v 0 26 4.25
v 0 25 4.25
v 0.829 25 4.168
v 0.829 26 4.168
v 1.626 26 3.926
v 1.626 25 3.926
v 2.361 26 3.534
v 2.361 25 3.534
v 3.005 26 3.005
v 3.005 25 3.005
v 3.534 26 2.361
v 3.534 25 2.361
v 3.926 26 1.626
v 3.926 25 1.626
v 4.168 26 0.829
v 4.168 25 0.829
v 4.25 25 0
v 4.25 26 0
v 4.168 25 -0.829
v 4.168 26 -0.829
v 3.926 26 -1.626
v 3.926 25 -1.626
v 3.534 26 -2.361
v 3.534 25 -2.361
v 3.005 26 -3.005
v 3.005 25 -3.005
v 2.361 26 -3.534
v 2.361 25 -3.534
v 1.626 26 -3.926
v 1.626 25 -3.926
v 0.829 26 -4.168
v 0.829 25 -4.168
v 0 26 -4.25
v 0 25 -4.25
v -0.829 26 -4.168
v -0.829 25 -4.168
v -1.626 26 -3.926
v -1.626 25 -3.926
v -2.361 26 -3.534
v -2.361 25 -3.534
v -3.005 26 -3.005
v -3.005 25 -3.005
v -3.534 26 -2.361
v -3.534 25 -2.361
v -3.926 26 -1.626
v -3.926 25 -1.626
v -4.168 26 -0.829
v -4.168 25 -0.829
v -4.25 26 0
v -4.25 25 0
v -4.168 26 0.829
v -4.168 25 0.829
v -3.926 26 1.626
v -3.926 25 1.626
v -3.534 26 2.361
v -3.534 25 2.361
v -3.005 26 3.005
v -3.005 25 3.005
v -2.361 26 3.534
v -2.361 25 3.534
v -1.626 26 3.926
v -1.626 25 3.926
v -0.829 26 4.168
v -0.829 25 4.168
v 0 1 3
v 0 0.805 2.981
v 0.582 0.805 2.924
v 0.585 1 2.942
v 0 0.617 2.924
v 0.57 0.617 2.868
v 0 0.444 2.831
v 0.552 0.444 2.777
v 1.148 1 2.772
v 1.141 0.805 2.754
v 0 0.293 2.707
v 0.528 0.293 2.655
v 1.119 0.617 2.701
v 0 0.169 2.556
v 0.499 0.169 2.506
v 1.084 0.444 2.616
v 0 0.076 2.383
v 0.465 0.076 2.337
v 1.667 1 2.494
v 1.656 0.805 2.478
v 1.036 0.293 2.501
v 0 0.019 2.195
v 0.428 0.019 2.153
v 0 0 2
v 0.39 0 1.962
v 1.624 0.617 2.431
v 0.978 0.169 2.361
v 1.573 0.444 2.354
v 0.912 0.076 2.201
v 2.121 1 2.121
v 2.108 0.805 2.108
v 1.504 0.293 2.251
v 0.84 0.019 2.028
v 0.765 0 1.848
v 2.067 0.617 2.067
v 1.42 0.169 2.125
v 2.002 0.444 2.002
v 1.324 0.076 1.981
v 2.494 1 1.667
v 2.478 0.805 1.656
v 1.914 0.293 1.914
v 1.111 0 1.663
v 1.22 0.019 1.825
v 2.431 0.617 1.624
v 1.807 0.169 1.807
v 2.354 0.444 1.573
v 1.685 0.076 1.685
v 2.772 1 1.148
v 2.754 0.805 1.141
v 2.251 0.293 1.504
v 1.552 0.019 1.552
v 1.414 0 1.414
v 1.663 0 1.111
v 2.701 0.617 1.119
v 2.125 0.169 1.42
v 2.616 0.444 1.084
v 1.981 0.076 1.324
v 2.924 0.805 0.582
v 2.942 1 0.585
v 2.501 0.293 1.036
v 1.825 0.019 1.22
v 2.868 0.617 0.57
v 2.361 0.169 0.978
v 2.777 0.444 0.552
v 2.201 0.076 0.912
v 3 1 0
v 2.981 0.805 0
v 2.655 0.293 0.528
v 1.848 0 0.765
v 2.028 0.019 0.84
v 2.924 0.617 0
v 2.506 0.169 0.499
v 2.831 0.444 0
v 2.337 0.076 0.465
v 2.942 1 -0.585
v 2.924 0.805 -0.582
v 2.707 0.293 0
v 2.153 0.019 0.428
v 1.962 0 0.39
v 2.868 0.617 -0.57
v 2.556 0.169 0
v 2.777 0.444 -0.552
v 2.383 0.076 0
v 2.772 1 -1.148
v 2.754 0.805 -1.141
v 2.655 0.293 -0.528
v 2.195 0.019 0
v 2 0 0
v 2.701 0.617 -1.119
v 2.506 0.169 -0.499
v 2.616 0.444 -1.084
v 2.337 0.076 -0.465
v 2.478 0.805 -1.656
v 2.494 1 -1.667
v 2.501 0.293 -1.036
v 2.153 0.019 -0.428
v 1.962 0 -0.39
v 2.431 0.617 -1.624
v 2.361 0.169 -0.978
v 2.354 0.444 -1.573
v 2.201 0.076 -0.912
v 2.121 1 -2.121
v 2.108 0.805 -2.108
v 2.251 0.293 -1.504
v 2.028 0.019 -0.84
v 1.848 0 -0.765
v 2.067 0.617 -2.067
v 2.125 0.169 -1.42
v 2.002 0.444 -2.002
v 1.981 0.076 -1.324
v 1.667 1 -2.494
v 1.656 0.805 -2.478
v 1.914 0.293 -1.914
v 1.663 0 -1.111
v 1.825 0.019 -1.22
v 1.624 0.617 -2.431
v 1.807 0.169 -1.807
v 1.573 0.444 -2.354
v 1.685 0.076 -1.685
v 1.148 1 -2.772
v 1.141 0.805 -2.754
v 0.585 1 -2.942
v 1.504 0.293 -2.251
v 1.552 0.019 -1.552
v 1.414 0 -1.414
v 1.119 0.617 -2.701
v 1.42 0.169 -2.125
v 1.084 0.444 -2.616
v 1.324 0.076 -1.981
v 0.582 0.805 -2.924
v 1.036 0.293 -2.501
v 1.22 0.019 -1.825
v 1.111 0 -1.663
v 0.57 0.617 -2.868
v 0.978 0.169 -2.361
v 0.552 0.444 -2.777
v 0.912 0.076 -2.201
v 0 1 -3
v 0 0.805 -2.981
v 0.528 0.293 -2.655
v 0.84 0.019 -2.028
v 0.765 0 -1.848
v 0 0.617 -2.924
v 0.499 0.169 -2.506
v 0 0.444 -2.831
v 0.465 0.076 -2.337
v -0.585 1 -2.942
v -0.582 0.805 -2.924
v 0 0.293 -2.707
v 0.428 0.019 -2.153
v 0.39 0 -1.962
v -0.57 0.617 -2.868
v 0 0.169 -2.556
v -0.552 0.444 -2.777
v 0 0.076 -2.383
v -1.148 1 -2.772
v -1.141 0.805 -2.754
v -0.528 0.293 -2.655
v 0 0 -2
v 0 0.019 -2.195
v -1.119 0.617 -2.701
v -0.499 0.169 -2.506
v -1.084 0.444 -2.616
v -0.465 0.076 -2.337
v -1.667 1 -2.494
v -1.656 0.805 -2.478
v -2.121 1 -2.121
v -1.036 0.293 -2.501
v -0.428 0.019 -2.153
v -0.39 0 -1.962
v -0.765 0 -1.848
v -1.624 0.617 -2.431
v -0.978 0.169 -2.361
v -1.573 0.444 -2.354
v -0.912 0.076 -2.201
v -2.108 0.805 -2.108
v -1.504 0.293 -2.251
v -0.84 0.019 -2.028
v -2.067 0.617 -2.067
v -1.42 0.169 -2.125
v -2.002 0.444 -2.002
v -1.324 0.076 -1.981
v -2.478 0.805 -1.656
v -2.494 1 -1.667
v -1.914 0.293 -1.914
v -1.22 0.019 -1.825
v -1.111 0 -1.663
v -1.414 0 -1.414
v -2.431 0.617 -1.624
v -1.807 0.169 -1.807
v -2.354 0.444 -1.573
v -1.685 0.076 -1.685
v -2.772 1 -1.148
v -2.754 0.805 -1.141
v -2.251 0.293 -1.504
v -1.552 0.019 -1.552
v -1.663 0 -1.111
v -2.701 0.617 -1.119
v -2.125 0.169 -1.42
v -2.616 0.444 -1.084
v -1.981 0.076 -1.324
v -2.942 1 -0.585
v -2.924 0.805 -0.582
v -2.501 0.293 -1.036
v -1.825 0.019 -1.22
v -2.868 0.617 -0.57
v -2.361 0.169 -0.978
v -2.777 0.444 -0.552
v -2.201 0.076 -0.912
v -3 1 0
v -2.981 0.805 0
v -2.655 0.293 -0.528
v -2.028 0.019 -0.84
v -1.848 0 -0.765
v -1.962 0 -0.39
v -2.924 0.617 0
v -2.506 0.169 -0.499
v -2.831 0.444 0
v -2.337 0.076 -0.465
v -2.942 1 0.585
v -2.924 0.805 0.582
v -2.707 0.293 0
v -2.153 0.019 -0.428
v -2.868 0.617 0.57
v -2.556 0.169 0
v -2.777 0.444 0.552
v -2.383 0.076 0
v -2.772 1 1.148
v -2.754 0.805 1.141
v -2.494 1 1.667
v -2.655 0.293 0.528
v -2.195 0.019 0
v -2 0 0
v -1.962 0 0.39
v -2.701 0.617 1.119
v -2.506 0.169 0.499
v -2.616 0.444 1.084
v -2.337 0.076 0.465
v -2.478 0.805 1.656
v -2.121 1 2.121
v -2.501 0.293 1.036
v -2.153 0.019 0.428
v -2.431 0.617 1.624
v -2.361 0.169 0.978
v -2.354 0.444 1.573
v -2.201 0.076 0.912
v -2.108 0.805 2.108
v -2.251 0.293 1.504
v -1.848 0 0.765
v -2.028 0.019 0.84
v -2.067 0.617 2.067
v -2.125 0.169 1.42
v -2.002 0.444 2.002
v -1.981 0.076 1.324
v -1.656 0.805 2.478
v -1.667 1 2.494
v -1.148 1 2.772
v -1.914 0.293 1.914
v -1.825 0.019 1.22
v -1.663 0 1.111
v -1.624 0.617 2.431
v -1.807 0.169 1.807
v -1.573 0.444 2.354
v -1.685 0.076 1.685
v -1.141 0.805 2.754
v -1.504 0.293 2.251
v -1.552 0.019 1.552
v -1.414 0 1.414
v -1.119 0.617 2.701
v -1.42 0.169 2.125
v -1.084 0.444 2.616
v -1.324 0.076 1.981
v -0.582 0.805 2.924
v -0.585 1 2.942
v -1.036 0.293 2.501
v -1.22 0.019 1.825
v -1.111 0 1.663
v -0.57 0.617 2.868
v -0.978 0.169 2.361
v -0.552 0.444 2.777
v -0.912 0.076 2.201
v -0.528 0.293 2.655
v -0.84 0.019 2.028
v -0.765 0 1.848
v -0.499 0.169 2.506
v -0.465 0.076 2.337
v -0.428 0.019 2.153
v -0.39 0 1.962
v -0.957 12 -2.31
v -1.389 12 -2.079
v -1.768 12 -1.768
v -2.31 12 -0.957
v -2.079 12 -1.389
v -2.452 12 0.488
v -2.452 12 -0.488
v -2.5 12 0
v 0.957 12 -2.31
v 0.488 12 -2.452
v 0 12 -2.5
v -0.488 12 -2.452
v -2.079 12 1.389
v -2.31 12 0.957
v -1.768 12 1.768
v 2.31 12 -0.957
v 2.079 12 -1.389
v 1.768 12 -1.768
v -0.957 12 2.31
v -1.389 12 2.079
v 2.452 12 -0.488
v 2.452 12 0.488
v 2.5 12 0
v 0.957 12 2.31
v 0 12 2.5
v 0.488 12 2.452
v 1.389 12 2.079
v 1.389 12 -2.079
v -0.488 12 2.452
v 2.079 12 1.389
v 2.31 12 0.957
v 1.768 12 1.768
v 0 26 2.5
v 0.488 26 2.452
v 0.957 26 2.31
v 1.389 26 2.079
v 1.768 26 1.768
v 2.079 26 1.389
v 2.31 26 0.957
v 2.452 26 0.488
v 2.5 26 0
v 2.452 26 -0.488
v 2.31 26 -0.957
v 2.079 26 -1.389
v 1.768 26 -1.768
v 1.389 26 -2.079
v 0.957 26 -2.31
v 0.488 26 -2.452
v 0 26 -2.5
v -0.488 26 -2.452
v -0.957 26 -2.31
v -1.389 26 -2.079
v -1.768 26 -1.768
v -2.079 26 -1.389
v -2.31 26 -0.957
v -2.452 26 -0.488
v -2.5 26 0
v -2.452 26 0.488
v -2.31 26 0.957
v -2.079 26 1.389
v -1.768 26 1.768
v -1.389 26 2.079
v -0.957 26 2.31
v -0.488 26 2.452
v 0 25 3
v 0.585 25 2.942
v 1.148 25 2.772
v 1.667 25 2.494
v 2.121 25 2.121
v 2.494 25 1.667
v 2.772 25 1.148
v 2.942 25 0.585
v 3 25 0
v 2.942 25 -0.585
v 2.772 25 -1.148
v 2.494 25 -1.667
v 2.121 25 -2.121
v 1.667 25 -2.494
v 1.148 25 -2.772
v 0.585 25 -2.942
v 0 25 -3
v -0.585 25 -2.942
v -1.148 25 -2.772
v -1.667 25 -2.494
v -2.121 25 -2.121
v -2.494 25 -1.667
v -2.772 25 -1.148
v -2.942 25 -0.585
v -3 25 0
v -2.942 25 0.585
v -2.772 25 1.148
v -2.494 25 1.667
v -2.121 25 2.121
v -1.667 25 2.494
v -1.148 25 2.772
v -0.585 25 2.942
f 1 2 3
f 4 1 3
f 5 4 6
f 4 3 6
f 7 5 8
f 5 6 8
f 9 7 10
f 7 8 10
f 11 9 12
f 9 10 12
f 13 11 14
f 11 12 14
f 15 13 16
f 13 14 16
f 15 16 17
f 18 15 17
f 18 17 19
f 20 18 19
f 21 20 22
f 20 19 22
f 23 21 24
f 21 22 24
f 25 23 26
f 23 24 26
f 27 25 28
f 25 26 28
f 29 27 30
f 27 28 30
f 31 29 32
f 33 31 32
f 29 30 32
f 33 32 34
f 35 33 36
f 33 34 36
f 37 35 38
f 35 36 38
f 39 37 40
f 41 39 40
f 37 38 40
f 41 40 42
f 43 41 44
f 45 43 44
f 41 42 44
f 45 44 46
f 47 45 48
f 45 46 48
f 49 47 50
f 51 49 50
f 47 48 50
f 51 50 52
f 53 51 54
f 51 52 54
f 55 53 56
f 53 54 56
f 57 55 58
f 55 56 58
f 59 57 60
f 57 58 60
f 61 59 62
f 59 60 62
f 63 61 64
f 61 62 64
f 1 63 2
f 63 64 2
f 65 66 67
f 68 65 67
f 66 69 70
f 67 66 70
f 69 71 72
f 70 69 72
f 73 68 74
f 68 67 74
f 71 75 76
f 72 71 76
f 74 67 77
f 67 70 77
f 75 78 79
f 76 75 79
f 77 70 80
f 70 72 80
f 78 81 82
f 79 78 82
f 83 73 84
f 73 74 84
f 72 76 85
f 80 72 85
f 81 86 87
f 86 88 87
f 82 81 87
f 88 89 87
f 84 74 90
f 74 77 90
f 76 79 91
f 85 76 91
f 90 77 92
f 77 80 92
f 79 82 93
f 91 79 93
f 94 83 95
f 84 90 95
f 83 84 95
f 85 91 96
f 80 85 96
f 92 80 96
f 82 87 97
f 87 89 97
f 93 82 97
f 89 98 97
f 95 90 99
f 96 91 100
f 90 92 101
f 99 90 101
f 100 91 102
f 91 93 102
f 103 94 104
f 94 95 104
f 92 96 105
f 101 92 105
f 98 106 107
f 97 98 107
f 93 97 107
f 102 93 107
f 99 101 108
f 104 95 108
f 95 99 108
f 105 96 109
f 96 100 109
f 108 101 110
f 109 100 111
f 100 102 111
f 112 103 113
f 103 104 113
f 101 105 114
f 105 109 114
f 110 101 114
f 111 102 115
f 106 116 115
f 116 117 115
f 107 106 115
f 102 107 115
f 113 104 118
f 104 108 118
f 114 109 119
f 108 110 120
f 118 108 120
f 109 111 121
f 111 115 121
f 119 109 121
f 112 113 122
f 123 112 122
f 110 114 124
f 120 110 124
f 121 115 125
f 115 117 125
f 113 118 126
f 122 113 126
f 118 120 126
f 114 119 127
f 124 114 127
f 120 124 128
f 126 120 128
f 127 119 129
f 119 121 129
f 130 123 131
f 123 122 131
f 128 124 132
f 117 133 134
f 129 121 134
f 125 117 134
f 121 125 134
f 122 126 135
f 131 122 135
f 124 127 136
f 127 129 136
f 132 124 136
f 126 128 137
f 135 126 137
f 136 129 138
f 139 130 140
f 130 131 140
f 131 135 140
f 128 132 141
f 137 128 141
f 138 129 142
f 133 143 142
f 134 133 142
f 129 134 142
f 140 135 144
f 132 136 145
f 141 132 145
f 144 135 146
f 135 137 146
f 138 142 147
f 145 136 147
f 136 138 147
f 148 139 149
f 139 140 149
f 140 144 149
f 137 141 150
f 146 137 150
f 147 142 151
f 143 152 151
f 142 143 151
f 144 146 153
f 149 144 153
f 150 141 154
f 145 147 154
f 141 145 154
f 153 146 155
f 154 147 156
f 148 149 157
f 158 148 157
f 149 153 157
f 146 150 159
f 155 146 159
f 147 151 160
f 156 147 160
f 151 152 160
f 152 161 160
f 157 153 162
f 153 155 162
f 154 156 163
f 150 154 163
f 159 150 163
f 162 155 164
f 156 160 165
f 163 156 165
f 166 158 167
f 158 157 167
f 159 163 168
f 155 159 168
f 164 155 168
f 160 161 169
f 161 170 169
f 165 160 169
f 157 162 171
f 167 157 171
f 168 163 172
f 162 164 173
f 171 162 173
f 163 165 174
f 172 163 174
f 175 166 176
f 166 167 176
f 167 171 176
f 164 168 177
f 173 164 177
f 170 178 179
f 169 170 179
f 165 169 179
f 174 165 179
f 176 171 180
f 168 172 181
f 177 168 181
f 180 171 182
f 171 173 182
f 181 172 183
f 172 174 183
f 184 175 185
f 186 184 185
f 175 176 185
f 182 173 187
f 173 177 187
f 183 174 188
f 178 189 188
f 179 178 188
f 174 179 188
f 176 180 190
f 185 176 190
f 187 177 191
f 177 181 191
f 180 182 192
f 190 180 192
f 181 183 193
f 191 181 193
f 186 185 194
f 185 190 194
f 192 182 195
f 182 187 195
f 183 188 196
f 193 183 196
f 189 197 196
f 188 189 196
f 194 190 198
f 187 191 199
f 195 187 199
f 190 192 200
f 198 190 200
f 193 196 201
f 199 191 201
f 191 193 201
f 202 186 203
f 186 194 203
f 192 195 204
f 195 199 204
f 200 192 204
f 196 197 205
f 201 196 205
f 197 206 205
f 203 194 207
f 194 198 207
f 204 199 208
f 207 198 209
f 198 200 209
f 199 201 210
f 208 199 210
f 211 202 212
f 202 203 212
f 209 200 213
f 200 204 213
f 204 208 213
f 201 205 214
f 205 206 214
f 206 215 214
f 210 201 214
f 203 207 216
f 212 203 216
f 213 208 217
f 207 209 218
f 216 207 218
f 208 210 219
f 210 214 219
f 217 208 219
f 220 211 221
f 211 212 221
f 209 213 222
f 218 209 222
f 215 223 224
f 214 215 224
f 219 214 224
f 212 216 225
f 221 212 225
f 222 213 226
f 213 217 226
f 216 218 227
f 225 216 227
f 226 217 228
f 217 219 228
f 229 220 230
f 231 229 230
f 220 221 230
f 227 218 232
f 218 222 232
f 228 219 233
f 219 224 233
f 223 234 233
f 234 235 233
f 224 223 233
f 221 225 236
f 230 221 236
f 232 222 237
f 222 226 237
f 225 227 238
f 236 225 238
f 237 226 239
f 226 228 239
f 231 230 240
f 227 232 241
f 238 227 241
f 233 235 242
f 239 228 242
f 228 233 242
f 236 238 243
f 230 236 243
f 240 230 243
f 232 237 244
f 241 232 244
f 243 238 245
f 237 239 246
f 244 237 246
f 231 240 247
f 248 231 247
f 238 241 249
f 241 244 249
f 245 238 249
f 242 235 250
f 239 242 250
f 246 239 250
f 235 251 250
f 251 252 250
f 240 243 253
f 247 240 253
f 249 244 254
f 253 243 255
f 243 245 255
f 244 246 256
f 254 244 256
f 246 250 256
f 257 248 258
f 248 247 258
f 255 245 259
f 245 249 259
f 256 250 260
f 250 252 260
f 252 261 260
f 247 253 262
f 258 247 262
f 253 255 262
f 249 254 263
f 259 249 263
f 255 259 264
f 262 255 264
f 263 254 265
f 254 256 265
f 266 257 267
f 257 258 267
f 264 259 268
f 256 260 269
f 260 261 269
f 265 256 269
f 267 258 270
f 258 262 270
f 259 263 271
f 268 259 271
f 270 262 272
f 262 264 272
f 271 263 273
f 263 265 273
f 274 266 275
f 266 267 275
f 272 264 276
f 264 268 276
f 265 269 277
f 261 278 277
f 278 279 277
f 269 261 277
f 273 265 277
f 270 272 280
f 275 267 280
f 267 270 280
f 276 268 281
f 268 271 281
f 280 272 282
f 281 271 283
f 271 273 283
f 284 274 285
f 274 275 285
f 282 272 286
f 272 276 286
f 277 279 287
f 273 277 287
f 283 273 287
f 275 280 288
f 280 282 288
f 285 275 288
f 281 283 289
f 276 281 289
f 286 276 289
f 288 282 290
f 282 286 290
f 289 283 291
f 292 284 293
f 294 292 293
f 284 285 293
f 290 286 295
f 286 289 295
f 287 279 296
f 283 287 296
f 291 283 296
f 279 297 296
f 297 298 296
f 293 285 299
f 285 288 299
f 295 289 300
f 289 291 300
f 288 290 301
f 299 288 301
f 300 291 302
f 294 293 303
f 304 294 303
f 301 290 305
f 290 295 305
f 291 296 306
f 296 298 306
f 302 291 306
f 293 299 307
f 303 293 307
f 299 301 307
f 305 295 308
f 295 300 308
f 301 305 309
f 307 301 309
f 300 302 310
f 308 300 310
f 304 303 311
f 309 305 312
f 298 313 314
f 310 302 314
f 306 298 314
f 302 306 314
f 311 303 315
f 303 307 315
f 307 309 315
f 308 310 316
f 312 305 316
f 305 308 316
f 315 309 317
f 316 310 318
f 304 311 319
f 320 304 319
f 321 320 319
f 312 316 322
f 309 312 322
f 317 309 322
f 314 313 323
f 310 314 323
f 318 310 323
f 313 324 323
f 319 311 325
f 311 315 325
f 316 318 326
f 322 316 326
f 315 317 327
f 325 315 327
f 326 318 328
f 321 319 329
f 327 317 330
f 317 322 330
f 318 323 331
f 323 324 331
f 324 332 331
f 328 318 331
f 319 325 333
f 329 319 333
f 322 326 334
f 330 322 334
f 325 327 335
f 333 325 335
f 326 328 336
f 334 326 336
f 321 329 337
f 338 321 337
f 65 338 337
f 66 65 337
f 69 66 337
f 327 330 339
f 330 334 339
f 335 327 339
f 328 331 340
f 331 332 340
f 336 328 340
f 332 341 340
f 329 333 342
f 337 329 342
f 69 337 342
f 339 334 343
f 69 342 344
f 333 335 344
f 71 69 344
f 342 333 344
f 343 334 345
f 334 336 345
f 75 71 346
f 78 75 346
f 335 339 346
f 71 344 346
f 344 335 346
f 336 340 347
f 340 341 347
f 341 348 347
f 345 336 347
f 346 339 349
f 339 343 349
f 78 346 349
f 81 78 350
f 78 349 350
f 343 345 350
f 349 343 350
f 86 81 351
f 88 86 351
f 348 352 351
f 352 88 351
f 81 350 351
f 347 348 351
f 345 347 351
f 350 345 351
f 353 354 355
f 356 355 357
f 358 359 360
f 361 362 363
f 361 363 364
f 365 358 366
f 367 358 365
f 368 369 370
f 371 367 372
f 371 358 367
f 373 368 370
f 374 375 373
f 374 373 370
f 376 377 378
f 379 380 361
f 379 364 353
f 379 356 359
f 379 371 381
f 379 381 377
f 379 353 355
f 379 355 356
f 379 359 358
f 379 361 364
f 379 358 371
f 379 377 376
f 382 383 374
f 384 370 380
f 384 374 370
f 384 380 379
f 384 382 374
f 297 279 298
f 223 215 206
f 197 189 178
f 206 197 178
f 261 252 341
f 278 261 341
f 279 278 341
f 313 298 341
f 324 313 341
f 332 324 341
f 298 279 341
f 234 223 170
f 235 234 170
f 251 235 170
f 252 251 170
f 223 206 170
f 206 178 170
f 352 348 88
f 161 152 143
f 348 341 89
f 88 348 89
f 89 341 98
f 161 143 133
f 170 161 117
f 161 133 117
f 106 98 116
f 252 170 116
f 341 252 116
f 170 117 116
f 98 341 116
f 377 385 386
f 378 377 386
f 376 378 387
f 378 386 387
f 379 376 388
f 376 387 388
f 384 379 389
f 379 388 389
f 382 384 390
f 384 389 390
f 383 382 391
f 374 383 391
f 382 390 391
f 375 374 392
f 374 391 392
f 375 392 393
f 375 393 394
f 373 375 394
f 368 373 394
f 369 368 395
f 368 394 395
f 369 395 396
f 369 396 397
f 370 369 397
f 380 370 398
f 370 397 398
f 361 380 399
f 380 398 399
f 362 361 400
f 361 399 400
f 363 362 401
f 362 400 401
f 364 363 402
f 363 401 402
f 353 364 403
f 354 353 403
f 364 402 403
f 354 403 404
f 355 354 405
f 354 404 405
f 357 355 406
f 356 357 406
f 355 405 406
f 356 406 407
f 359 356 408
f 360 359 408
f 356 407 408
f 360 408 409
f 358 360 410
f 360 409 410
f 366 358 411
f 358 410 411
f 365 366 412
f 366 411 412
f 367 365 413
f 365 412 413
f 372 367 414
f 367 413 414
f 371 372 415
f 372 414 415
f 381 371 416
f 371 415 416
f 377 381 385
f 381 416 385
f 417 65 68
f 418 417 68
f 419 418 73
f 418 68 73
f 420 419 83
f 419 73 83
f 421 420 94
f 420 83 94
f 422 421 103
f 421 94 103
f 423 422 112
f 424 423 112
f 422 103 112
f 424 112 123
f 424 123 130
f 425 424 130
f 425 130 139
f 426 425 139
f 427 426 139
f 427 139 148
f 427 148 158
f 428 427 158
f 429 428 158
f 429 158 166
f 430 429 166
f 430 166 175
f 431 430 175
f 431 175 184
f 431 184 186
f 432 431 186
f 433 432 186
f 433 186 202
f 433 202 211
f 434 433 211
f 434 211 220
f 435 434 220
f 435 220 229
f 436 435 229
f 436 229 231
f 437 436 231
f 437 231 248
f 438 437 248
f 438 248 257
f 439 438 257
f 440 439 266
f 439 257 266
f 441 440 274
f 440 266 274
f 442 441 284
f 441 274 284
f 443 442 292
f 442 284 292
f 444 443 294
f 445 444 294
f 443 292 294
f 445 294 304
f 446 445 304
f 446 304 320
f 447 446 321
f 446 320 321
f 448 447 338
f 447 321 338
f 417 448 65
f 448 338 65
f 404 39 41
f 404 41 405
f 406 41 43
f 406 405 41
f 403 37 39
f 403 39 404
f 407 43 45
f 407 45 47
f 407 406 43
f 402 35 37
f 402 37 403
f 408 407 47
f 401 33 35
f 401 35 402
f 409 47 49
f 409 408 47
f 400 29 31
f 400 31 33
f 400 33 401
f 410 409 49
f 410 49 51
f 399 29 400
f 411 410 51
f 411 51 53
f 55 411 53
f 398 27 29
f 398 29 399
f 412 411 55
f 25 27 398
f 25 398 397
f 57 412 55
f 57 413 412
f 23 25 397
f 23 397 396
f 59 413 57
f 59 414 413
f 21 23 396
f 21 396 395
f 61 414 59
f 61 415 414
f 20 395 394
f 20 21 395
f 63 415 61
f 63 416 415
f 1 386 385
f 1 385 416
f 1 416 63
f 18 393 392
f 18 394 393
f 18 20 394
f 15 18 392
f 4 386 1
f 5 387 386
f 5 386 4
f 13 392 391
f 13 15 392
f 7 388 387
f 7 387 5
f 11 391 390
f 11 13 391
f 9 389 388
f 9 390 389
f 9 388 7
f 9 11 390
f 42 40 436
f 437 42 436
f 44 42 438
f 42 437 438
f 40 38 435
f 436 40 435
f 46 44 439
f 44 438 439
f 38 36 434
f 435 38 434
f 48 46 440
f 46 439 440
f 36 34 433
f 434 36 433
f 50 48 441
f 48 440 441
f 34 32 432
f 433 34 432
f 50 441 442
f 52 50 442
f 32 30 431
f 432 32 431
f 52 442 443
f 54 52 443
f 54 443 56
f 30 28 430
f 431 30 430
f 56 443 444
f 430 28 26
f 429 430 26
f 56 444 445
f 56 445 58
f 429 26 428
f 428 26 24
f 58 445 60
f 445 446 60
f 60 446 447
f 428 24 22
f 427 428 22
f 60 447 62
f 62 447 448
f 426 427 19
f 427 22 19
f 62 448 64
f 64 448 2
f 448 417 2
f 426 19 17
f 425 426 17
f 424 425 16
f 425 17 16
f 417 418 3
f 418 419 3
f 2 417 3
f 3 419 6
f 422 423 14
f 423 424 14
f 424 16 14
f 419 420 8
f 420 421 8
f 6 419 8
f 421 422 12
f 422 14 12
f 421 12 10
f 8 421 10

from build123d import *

# Parameters (mm, degrees)
SKETCH2_R           = 3
BOSS_EXTRUDE1_DEPTH = 26
SKETCH4_R           = 2.5
CUT_EXTRUDE1_DEPTH  = 14
FILLET3_R           = 1
BOSS_EXTRUDE2_START = -1
SKETCH5_R           = 4.25
SKETCH5_R_2         = 3
BOSS_EXTRUDE2_DEPTH = 1


with BuildPart() as part:
    # Sketch2 → Boss-Extrude1 (new body)
    with BuildSketch(Plane(origin=(0, 0, 0), x_dir=(1, 0, 0), z_dir=(0, 1, 0))):
        with Locations(Location((0, 0, 0), (0, 0, 270))):
            Circle(SKETCH2_R)
    extrude(amount=BOSS_EXTRUDE1_DEPTH)

    # Sketch4 → Cut-Extrude1 (cut)
    with BuildSketch(Plane(origin=(0, 26, 0), x_dir=(1, 0, 0), z_dir=(0, 1, 0))):
        with Locations(Location((0, 0, 0), (0, 0, 270))):
            Circle(SKETCH4_R)
    extrude(amount=-CUT_EXTRUDE1_DEPTH, mode=Mode.SUBTRACT)

    # Fillet3
    fillet3_edges = [part.edges().sort_by_distance(p)[0] for p in [
        (0, 0, -3),
    ]]
    fillet(fillet3_edges, radius=FILLET3_R)

    # Sketch5 → Boss-Extrude2 (add)
    with BuildSketch(Plane(origin=(0, 26, 0), x_dir=(1, 0, 0), z_dir=(0, 1, 0)).offset(BOSS_EXTRUDE2_START)):
        with Locations(Location((0, 0, 0), (0, 0, 270))):
            Circle(SKETCH5_R)
        with Locations(Location((0, 0, 0), (0, 0, 270))):
            Circle(SKETCH5_R_2, mode=Mode.SUBTRACT)
    extrude(amount=BOSS_EXTRUDE2_DEPTH)


solid = part.part
